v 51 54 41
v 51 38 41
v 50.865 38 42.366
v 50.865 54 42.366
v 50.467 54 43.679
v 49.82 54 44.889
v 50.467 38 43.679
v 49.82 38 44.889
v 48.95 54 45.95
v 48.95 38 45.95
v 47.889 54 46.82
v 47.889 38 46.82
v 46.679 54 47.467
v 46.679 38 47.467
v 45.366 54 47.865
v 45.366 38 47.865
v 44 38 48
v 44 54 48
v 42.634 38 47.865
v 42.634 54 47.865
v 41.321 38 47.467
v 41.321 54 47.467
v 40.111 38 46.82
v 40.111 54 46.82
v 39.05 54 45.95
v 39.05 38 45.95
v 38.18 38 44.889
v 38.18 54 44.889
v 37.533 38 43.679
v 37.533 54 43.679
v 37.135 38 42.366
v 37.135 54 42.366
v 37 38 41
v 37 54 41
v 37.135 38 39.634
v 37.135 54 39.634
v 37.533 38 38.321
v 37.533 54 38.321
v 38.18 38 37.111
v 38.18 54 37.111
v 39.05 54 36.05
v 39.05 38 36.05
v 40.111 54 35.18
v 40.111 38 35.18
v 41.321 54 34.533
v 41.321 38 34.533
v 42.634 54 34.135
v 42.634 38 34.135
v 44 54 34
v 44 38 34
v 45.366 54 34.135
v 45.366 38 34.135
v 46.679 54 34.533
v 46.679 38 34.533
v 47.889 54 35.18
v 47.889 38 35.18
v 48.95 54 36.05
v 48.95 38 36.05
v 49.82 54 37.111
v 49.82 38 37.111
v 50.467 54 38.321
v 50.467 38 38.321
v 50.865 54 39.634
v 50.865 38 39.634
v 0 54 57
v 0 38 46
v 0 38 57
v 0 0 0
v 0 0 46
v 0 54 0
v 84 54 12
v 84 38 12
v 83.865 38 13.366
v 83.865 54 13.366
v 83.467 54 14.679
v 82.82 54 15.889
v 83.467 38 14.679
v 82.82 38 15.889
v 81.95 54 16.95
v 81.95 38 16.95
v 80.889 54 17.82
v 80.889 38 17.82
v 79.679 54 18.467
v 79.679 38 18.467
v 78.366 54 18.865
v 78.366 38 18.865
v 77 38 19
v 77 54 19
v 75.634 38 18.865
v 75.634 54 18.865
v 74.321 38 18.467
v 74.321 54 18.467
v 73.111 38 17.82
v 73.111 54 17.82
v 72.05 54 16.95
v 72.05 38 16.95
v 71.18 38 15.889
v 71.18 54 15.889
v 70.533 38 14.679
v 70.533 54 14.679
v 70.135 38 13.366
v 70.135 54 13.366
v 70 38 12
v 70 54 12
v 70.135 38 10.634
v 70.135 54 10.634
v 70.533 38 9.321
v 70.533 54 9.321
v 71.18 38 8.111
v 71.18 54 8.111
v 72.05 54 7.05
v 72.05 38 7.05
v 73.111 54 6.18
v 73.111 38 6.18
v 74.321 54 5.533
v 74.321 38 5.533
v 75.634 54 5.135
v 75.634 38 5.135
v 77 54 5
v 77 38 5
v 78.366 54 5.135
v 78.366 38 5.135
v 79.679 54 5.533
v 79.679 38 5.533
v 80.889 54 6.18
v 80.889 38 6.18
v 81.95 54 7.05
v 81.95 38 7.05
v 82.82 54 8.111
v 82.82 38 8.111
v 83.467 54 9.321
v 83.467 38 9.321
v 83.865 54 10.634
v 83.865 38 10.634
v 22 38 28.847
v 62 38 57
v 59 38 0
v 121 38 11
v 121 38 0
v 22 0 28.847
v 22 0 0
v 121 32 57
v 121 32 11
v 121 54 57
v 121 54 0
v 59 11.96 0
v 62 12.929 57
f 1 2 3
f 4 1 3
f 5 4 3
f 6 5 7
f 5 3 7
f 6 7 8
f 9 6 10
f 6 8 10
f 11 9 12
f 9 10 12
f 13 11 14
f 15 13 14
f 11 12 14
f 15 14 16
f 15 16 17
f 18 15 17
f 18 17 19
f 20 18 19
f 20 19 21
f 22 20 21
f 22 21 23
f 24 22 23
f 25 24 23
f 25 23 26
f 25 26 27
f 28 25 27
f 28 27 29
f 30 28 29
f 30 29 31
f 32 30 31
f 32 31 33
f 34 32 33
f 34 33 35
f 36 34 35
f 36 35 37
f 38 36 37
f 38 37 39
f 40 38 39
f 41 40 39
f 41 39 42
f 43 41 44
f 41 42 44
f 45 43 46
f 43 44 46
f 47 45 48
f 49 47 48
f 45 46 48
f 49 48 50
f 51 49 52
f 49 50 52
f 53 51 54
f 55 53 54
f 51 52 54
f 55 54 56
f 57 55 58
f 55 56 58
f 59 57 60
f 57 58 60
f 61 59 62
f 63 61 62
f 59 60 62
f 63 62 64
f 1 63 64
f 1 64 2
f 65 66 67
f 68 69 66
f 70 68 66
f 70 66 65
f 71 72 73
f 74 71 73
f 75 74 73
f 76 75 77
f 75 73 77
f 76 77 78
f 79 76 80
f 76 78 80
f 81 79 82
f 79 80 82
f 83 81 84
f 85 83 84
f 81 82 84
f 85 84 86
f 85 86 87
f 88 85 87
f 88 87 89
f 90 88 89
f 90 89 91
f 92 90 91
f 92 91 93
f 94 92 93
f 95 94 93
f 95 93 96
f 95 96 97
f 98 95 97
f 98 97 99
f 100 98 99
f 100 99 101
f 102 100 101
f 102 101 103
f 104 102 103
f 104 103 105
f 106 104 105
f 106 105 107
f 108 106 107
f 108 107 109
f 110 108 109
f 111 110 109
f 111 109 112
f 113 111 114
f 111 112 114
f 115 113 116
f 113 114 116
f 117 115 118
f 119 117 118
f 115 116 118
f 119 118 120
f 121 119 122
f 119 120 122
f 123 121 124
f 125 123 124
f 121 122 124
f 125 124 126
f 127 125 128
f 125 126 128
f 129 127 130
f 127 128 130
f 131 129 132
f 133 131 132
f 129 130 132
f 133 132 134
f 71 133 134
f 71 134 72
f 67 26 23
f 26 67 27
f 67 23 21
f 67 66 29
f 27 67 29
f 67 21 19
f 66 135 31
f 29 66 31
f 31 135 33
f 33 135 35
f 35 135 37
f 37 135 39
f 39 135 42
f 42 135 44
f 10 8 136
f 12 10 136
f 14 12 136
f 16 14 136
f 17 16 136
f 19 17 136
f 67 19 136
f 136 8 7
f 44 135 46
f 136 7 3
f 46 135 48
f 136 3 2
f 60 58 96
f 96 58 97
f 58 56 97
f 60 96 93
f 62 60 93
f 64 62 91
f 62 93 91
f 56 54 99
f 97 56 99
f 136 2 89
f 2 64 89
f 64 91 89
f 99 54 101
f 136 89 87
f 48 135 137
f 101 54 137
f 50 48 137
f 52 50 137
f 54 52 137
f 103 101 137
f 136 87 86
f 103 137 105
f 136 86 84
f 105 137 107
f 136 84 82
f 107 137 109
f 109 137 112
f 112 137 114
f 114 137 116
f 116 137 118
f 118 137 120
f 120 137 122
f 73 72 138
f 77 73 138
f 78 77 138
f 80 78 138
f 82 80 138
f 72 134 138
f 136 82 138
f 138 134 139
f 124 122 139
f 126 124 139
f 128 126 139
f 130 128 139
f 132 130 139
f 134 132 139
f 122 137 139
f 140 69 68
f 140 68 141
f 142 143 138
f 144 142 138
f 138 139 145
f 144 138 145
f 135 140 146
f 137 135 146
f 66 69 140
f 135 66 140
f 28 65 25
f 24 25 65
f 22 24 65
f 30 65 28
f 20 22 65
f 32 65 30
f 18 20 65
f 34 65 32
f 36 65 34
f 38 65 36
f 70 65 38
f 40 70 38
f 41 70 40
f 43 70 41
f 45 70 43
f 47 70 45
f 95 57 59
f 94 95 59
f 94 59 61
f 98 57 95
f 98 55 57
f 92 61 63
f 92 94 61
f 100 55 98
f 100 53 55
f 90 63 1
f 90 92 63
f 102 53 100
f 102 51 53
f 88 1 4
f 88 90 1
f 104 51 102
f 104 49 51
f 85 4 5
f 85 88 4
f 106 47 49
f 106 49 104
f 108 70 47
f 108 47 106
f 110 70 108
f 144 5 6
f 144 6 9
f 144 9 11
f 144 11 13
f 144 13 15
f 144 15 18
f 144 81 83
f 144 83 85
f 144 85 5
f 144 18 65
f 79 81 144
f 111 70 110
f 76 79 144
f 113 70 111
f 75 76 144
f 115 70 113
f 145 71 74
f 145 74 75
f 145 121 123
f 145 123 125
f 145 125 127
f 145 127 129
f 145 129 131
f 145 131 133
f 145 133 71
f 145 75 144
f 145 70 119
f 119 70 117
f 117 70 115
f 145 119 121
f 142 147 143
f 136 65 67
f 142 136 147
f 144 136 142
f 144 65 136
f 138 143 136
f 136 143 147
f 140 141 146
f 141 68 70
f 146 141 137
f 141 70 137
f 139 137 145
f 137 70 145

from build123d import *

# Parameters (mm, degrees)
F0_R          = 7
F1_DEPTH      = 38
F3_DEPTH      = 57
F4_DEPTH      = 54
F5_W          = 121
F5_H          = 16
F6_DEPTH      = 57
F7_DEPTH      = 54
F7_DEPTH_BACK = 38


with BuildPart() as f1:
    # F0 (on Front) → F1 (new body)
    with BuildSketch(Plane.XZ):
        Polygon((0, 46), (0, 0), (22, 0), (22, 28.847458), align=None)
        Polygon((22, 28.847458), (22, 0), (59, 0), align=None)
        Polygon((121, 57), (62, 57), (121, 11), align=None)
        Polygon((0, 57), (0, 46), (22, 28.847458), (59, 0), (121, 0), (121, 11), (62, 57), align=None)
        with Locations((77, 12)):
            Circle(F0_R, mode=Mode.SUBTRACT)
        with Locations((44, 41)):
            Circle(F0_R, mode=Mode.SUBTRACT)
    extrude(amount=-F1_DEPTH)

    # F2 (on face) → F3 (cut)
    with BuildSketch(Plane(origin=(0, 0, 0), x_dir=(1, 0, 0), z_dir=(0, 0, -1))):
        Polygon((121, 0), (22, 0), (121, -32), align=None)
    extrude(amount=-F3_DEPTH, mode=Mode.SUBTRACT)

    # F0 (on Front) → F4 (cut)
    with BuildSketch(Plane.XZ):
        Polygon((0, 57), (0, 46), (22, 28.847458), (59, 0), (121, 0), (121, 11), (62, 57), align=None)
        with Locations((77, 12)):
            Circle(F0_R, mode=Mode.SUBTRACT)
        with Locations((44, 41)):
            Circle(F0_R, mode=Mode.SUBTRACT)
    extrude(amount=-F4_DEPTH, mode=Mode.SUBTRACT)

    # F5 (on Top) → F6 (join)
    with BuildSketch(Plane.XY):
        with Locations((60.5, 46)):
            Rectangle(F5_W, F5_H)
    extrude(amount=F6_DEPTH)

    # F0 (on Front) → F7 (cut, two sides)
    with BuildSketch(Plane.XZ) as f7_sk:
        with Locations((44, 41)):
            Circle(F0_R)
        with Locations((77, 12)):
            Circle(F0_R)
    extrude(amount=-F7_DEPTH, mode=Mode.SUBTRACT)
    extrude(f7_sk.sketch, amount=-F7_DEPTH_BACK, mode=Mode.SUBTRACT)


solid = f1.part
